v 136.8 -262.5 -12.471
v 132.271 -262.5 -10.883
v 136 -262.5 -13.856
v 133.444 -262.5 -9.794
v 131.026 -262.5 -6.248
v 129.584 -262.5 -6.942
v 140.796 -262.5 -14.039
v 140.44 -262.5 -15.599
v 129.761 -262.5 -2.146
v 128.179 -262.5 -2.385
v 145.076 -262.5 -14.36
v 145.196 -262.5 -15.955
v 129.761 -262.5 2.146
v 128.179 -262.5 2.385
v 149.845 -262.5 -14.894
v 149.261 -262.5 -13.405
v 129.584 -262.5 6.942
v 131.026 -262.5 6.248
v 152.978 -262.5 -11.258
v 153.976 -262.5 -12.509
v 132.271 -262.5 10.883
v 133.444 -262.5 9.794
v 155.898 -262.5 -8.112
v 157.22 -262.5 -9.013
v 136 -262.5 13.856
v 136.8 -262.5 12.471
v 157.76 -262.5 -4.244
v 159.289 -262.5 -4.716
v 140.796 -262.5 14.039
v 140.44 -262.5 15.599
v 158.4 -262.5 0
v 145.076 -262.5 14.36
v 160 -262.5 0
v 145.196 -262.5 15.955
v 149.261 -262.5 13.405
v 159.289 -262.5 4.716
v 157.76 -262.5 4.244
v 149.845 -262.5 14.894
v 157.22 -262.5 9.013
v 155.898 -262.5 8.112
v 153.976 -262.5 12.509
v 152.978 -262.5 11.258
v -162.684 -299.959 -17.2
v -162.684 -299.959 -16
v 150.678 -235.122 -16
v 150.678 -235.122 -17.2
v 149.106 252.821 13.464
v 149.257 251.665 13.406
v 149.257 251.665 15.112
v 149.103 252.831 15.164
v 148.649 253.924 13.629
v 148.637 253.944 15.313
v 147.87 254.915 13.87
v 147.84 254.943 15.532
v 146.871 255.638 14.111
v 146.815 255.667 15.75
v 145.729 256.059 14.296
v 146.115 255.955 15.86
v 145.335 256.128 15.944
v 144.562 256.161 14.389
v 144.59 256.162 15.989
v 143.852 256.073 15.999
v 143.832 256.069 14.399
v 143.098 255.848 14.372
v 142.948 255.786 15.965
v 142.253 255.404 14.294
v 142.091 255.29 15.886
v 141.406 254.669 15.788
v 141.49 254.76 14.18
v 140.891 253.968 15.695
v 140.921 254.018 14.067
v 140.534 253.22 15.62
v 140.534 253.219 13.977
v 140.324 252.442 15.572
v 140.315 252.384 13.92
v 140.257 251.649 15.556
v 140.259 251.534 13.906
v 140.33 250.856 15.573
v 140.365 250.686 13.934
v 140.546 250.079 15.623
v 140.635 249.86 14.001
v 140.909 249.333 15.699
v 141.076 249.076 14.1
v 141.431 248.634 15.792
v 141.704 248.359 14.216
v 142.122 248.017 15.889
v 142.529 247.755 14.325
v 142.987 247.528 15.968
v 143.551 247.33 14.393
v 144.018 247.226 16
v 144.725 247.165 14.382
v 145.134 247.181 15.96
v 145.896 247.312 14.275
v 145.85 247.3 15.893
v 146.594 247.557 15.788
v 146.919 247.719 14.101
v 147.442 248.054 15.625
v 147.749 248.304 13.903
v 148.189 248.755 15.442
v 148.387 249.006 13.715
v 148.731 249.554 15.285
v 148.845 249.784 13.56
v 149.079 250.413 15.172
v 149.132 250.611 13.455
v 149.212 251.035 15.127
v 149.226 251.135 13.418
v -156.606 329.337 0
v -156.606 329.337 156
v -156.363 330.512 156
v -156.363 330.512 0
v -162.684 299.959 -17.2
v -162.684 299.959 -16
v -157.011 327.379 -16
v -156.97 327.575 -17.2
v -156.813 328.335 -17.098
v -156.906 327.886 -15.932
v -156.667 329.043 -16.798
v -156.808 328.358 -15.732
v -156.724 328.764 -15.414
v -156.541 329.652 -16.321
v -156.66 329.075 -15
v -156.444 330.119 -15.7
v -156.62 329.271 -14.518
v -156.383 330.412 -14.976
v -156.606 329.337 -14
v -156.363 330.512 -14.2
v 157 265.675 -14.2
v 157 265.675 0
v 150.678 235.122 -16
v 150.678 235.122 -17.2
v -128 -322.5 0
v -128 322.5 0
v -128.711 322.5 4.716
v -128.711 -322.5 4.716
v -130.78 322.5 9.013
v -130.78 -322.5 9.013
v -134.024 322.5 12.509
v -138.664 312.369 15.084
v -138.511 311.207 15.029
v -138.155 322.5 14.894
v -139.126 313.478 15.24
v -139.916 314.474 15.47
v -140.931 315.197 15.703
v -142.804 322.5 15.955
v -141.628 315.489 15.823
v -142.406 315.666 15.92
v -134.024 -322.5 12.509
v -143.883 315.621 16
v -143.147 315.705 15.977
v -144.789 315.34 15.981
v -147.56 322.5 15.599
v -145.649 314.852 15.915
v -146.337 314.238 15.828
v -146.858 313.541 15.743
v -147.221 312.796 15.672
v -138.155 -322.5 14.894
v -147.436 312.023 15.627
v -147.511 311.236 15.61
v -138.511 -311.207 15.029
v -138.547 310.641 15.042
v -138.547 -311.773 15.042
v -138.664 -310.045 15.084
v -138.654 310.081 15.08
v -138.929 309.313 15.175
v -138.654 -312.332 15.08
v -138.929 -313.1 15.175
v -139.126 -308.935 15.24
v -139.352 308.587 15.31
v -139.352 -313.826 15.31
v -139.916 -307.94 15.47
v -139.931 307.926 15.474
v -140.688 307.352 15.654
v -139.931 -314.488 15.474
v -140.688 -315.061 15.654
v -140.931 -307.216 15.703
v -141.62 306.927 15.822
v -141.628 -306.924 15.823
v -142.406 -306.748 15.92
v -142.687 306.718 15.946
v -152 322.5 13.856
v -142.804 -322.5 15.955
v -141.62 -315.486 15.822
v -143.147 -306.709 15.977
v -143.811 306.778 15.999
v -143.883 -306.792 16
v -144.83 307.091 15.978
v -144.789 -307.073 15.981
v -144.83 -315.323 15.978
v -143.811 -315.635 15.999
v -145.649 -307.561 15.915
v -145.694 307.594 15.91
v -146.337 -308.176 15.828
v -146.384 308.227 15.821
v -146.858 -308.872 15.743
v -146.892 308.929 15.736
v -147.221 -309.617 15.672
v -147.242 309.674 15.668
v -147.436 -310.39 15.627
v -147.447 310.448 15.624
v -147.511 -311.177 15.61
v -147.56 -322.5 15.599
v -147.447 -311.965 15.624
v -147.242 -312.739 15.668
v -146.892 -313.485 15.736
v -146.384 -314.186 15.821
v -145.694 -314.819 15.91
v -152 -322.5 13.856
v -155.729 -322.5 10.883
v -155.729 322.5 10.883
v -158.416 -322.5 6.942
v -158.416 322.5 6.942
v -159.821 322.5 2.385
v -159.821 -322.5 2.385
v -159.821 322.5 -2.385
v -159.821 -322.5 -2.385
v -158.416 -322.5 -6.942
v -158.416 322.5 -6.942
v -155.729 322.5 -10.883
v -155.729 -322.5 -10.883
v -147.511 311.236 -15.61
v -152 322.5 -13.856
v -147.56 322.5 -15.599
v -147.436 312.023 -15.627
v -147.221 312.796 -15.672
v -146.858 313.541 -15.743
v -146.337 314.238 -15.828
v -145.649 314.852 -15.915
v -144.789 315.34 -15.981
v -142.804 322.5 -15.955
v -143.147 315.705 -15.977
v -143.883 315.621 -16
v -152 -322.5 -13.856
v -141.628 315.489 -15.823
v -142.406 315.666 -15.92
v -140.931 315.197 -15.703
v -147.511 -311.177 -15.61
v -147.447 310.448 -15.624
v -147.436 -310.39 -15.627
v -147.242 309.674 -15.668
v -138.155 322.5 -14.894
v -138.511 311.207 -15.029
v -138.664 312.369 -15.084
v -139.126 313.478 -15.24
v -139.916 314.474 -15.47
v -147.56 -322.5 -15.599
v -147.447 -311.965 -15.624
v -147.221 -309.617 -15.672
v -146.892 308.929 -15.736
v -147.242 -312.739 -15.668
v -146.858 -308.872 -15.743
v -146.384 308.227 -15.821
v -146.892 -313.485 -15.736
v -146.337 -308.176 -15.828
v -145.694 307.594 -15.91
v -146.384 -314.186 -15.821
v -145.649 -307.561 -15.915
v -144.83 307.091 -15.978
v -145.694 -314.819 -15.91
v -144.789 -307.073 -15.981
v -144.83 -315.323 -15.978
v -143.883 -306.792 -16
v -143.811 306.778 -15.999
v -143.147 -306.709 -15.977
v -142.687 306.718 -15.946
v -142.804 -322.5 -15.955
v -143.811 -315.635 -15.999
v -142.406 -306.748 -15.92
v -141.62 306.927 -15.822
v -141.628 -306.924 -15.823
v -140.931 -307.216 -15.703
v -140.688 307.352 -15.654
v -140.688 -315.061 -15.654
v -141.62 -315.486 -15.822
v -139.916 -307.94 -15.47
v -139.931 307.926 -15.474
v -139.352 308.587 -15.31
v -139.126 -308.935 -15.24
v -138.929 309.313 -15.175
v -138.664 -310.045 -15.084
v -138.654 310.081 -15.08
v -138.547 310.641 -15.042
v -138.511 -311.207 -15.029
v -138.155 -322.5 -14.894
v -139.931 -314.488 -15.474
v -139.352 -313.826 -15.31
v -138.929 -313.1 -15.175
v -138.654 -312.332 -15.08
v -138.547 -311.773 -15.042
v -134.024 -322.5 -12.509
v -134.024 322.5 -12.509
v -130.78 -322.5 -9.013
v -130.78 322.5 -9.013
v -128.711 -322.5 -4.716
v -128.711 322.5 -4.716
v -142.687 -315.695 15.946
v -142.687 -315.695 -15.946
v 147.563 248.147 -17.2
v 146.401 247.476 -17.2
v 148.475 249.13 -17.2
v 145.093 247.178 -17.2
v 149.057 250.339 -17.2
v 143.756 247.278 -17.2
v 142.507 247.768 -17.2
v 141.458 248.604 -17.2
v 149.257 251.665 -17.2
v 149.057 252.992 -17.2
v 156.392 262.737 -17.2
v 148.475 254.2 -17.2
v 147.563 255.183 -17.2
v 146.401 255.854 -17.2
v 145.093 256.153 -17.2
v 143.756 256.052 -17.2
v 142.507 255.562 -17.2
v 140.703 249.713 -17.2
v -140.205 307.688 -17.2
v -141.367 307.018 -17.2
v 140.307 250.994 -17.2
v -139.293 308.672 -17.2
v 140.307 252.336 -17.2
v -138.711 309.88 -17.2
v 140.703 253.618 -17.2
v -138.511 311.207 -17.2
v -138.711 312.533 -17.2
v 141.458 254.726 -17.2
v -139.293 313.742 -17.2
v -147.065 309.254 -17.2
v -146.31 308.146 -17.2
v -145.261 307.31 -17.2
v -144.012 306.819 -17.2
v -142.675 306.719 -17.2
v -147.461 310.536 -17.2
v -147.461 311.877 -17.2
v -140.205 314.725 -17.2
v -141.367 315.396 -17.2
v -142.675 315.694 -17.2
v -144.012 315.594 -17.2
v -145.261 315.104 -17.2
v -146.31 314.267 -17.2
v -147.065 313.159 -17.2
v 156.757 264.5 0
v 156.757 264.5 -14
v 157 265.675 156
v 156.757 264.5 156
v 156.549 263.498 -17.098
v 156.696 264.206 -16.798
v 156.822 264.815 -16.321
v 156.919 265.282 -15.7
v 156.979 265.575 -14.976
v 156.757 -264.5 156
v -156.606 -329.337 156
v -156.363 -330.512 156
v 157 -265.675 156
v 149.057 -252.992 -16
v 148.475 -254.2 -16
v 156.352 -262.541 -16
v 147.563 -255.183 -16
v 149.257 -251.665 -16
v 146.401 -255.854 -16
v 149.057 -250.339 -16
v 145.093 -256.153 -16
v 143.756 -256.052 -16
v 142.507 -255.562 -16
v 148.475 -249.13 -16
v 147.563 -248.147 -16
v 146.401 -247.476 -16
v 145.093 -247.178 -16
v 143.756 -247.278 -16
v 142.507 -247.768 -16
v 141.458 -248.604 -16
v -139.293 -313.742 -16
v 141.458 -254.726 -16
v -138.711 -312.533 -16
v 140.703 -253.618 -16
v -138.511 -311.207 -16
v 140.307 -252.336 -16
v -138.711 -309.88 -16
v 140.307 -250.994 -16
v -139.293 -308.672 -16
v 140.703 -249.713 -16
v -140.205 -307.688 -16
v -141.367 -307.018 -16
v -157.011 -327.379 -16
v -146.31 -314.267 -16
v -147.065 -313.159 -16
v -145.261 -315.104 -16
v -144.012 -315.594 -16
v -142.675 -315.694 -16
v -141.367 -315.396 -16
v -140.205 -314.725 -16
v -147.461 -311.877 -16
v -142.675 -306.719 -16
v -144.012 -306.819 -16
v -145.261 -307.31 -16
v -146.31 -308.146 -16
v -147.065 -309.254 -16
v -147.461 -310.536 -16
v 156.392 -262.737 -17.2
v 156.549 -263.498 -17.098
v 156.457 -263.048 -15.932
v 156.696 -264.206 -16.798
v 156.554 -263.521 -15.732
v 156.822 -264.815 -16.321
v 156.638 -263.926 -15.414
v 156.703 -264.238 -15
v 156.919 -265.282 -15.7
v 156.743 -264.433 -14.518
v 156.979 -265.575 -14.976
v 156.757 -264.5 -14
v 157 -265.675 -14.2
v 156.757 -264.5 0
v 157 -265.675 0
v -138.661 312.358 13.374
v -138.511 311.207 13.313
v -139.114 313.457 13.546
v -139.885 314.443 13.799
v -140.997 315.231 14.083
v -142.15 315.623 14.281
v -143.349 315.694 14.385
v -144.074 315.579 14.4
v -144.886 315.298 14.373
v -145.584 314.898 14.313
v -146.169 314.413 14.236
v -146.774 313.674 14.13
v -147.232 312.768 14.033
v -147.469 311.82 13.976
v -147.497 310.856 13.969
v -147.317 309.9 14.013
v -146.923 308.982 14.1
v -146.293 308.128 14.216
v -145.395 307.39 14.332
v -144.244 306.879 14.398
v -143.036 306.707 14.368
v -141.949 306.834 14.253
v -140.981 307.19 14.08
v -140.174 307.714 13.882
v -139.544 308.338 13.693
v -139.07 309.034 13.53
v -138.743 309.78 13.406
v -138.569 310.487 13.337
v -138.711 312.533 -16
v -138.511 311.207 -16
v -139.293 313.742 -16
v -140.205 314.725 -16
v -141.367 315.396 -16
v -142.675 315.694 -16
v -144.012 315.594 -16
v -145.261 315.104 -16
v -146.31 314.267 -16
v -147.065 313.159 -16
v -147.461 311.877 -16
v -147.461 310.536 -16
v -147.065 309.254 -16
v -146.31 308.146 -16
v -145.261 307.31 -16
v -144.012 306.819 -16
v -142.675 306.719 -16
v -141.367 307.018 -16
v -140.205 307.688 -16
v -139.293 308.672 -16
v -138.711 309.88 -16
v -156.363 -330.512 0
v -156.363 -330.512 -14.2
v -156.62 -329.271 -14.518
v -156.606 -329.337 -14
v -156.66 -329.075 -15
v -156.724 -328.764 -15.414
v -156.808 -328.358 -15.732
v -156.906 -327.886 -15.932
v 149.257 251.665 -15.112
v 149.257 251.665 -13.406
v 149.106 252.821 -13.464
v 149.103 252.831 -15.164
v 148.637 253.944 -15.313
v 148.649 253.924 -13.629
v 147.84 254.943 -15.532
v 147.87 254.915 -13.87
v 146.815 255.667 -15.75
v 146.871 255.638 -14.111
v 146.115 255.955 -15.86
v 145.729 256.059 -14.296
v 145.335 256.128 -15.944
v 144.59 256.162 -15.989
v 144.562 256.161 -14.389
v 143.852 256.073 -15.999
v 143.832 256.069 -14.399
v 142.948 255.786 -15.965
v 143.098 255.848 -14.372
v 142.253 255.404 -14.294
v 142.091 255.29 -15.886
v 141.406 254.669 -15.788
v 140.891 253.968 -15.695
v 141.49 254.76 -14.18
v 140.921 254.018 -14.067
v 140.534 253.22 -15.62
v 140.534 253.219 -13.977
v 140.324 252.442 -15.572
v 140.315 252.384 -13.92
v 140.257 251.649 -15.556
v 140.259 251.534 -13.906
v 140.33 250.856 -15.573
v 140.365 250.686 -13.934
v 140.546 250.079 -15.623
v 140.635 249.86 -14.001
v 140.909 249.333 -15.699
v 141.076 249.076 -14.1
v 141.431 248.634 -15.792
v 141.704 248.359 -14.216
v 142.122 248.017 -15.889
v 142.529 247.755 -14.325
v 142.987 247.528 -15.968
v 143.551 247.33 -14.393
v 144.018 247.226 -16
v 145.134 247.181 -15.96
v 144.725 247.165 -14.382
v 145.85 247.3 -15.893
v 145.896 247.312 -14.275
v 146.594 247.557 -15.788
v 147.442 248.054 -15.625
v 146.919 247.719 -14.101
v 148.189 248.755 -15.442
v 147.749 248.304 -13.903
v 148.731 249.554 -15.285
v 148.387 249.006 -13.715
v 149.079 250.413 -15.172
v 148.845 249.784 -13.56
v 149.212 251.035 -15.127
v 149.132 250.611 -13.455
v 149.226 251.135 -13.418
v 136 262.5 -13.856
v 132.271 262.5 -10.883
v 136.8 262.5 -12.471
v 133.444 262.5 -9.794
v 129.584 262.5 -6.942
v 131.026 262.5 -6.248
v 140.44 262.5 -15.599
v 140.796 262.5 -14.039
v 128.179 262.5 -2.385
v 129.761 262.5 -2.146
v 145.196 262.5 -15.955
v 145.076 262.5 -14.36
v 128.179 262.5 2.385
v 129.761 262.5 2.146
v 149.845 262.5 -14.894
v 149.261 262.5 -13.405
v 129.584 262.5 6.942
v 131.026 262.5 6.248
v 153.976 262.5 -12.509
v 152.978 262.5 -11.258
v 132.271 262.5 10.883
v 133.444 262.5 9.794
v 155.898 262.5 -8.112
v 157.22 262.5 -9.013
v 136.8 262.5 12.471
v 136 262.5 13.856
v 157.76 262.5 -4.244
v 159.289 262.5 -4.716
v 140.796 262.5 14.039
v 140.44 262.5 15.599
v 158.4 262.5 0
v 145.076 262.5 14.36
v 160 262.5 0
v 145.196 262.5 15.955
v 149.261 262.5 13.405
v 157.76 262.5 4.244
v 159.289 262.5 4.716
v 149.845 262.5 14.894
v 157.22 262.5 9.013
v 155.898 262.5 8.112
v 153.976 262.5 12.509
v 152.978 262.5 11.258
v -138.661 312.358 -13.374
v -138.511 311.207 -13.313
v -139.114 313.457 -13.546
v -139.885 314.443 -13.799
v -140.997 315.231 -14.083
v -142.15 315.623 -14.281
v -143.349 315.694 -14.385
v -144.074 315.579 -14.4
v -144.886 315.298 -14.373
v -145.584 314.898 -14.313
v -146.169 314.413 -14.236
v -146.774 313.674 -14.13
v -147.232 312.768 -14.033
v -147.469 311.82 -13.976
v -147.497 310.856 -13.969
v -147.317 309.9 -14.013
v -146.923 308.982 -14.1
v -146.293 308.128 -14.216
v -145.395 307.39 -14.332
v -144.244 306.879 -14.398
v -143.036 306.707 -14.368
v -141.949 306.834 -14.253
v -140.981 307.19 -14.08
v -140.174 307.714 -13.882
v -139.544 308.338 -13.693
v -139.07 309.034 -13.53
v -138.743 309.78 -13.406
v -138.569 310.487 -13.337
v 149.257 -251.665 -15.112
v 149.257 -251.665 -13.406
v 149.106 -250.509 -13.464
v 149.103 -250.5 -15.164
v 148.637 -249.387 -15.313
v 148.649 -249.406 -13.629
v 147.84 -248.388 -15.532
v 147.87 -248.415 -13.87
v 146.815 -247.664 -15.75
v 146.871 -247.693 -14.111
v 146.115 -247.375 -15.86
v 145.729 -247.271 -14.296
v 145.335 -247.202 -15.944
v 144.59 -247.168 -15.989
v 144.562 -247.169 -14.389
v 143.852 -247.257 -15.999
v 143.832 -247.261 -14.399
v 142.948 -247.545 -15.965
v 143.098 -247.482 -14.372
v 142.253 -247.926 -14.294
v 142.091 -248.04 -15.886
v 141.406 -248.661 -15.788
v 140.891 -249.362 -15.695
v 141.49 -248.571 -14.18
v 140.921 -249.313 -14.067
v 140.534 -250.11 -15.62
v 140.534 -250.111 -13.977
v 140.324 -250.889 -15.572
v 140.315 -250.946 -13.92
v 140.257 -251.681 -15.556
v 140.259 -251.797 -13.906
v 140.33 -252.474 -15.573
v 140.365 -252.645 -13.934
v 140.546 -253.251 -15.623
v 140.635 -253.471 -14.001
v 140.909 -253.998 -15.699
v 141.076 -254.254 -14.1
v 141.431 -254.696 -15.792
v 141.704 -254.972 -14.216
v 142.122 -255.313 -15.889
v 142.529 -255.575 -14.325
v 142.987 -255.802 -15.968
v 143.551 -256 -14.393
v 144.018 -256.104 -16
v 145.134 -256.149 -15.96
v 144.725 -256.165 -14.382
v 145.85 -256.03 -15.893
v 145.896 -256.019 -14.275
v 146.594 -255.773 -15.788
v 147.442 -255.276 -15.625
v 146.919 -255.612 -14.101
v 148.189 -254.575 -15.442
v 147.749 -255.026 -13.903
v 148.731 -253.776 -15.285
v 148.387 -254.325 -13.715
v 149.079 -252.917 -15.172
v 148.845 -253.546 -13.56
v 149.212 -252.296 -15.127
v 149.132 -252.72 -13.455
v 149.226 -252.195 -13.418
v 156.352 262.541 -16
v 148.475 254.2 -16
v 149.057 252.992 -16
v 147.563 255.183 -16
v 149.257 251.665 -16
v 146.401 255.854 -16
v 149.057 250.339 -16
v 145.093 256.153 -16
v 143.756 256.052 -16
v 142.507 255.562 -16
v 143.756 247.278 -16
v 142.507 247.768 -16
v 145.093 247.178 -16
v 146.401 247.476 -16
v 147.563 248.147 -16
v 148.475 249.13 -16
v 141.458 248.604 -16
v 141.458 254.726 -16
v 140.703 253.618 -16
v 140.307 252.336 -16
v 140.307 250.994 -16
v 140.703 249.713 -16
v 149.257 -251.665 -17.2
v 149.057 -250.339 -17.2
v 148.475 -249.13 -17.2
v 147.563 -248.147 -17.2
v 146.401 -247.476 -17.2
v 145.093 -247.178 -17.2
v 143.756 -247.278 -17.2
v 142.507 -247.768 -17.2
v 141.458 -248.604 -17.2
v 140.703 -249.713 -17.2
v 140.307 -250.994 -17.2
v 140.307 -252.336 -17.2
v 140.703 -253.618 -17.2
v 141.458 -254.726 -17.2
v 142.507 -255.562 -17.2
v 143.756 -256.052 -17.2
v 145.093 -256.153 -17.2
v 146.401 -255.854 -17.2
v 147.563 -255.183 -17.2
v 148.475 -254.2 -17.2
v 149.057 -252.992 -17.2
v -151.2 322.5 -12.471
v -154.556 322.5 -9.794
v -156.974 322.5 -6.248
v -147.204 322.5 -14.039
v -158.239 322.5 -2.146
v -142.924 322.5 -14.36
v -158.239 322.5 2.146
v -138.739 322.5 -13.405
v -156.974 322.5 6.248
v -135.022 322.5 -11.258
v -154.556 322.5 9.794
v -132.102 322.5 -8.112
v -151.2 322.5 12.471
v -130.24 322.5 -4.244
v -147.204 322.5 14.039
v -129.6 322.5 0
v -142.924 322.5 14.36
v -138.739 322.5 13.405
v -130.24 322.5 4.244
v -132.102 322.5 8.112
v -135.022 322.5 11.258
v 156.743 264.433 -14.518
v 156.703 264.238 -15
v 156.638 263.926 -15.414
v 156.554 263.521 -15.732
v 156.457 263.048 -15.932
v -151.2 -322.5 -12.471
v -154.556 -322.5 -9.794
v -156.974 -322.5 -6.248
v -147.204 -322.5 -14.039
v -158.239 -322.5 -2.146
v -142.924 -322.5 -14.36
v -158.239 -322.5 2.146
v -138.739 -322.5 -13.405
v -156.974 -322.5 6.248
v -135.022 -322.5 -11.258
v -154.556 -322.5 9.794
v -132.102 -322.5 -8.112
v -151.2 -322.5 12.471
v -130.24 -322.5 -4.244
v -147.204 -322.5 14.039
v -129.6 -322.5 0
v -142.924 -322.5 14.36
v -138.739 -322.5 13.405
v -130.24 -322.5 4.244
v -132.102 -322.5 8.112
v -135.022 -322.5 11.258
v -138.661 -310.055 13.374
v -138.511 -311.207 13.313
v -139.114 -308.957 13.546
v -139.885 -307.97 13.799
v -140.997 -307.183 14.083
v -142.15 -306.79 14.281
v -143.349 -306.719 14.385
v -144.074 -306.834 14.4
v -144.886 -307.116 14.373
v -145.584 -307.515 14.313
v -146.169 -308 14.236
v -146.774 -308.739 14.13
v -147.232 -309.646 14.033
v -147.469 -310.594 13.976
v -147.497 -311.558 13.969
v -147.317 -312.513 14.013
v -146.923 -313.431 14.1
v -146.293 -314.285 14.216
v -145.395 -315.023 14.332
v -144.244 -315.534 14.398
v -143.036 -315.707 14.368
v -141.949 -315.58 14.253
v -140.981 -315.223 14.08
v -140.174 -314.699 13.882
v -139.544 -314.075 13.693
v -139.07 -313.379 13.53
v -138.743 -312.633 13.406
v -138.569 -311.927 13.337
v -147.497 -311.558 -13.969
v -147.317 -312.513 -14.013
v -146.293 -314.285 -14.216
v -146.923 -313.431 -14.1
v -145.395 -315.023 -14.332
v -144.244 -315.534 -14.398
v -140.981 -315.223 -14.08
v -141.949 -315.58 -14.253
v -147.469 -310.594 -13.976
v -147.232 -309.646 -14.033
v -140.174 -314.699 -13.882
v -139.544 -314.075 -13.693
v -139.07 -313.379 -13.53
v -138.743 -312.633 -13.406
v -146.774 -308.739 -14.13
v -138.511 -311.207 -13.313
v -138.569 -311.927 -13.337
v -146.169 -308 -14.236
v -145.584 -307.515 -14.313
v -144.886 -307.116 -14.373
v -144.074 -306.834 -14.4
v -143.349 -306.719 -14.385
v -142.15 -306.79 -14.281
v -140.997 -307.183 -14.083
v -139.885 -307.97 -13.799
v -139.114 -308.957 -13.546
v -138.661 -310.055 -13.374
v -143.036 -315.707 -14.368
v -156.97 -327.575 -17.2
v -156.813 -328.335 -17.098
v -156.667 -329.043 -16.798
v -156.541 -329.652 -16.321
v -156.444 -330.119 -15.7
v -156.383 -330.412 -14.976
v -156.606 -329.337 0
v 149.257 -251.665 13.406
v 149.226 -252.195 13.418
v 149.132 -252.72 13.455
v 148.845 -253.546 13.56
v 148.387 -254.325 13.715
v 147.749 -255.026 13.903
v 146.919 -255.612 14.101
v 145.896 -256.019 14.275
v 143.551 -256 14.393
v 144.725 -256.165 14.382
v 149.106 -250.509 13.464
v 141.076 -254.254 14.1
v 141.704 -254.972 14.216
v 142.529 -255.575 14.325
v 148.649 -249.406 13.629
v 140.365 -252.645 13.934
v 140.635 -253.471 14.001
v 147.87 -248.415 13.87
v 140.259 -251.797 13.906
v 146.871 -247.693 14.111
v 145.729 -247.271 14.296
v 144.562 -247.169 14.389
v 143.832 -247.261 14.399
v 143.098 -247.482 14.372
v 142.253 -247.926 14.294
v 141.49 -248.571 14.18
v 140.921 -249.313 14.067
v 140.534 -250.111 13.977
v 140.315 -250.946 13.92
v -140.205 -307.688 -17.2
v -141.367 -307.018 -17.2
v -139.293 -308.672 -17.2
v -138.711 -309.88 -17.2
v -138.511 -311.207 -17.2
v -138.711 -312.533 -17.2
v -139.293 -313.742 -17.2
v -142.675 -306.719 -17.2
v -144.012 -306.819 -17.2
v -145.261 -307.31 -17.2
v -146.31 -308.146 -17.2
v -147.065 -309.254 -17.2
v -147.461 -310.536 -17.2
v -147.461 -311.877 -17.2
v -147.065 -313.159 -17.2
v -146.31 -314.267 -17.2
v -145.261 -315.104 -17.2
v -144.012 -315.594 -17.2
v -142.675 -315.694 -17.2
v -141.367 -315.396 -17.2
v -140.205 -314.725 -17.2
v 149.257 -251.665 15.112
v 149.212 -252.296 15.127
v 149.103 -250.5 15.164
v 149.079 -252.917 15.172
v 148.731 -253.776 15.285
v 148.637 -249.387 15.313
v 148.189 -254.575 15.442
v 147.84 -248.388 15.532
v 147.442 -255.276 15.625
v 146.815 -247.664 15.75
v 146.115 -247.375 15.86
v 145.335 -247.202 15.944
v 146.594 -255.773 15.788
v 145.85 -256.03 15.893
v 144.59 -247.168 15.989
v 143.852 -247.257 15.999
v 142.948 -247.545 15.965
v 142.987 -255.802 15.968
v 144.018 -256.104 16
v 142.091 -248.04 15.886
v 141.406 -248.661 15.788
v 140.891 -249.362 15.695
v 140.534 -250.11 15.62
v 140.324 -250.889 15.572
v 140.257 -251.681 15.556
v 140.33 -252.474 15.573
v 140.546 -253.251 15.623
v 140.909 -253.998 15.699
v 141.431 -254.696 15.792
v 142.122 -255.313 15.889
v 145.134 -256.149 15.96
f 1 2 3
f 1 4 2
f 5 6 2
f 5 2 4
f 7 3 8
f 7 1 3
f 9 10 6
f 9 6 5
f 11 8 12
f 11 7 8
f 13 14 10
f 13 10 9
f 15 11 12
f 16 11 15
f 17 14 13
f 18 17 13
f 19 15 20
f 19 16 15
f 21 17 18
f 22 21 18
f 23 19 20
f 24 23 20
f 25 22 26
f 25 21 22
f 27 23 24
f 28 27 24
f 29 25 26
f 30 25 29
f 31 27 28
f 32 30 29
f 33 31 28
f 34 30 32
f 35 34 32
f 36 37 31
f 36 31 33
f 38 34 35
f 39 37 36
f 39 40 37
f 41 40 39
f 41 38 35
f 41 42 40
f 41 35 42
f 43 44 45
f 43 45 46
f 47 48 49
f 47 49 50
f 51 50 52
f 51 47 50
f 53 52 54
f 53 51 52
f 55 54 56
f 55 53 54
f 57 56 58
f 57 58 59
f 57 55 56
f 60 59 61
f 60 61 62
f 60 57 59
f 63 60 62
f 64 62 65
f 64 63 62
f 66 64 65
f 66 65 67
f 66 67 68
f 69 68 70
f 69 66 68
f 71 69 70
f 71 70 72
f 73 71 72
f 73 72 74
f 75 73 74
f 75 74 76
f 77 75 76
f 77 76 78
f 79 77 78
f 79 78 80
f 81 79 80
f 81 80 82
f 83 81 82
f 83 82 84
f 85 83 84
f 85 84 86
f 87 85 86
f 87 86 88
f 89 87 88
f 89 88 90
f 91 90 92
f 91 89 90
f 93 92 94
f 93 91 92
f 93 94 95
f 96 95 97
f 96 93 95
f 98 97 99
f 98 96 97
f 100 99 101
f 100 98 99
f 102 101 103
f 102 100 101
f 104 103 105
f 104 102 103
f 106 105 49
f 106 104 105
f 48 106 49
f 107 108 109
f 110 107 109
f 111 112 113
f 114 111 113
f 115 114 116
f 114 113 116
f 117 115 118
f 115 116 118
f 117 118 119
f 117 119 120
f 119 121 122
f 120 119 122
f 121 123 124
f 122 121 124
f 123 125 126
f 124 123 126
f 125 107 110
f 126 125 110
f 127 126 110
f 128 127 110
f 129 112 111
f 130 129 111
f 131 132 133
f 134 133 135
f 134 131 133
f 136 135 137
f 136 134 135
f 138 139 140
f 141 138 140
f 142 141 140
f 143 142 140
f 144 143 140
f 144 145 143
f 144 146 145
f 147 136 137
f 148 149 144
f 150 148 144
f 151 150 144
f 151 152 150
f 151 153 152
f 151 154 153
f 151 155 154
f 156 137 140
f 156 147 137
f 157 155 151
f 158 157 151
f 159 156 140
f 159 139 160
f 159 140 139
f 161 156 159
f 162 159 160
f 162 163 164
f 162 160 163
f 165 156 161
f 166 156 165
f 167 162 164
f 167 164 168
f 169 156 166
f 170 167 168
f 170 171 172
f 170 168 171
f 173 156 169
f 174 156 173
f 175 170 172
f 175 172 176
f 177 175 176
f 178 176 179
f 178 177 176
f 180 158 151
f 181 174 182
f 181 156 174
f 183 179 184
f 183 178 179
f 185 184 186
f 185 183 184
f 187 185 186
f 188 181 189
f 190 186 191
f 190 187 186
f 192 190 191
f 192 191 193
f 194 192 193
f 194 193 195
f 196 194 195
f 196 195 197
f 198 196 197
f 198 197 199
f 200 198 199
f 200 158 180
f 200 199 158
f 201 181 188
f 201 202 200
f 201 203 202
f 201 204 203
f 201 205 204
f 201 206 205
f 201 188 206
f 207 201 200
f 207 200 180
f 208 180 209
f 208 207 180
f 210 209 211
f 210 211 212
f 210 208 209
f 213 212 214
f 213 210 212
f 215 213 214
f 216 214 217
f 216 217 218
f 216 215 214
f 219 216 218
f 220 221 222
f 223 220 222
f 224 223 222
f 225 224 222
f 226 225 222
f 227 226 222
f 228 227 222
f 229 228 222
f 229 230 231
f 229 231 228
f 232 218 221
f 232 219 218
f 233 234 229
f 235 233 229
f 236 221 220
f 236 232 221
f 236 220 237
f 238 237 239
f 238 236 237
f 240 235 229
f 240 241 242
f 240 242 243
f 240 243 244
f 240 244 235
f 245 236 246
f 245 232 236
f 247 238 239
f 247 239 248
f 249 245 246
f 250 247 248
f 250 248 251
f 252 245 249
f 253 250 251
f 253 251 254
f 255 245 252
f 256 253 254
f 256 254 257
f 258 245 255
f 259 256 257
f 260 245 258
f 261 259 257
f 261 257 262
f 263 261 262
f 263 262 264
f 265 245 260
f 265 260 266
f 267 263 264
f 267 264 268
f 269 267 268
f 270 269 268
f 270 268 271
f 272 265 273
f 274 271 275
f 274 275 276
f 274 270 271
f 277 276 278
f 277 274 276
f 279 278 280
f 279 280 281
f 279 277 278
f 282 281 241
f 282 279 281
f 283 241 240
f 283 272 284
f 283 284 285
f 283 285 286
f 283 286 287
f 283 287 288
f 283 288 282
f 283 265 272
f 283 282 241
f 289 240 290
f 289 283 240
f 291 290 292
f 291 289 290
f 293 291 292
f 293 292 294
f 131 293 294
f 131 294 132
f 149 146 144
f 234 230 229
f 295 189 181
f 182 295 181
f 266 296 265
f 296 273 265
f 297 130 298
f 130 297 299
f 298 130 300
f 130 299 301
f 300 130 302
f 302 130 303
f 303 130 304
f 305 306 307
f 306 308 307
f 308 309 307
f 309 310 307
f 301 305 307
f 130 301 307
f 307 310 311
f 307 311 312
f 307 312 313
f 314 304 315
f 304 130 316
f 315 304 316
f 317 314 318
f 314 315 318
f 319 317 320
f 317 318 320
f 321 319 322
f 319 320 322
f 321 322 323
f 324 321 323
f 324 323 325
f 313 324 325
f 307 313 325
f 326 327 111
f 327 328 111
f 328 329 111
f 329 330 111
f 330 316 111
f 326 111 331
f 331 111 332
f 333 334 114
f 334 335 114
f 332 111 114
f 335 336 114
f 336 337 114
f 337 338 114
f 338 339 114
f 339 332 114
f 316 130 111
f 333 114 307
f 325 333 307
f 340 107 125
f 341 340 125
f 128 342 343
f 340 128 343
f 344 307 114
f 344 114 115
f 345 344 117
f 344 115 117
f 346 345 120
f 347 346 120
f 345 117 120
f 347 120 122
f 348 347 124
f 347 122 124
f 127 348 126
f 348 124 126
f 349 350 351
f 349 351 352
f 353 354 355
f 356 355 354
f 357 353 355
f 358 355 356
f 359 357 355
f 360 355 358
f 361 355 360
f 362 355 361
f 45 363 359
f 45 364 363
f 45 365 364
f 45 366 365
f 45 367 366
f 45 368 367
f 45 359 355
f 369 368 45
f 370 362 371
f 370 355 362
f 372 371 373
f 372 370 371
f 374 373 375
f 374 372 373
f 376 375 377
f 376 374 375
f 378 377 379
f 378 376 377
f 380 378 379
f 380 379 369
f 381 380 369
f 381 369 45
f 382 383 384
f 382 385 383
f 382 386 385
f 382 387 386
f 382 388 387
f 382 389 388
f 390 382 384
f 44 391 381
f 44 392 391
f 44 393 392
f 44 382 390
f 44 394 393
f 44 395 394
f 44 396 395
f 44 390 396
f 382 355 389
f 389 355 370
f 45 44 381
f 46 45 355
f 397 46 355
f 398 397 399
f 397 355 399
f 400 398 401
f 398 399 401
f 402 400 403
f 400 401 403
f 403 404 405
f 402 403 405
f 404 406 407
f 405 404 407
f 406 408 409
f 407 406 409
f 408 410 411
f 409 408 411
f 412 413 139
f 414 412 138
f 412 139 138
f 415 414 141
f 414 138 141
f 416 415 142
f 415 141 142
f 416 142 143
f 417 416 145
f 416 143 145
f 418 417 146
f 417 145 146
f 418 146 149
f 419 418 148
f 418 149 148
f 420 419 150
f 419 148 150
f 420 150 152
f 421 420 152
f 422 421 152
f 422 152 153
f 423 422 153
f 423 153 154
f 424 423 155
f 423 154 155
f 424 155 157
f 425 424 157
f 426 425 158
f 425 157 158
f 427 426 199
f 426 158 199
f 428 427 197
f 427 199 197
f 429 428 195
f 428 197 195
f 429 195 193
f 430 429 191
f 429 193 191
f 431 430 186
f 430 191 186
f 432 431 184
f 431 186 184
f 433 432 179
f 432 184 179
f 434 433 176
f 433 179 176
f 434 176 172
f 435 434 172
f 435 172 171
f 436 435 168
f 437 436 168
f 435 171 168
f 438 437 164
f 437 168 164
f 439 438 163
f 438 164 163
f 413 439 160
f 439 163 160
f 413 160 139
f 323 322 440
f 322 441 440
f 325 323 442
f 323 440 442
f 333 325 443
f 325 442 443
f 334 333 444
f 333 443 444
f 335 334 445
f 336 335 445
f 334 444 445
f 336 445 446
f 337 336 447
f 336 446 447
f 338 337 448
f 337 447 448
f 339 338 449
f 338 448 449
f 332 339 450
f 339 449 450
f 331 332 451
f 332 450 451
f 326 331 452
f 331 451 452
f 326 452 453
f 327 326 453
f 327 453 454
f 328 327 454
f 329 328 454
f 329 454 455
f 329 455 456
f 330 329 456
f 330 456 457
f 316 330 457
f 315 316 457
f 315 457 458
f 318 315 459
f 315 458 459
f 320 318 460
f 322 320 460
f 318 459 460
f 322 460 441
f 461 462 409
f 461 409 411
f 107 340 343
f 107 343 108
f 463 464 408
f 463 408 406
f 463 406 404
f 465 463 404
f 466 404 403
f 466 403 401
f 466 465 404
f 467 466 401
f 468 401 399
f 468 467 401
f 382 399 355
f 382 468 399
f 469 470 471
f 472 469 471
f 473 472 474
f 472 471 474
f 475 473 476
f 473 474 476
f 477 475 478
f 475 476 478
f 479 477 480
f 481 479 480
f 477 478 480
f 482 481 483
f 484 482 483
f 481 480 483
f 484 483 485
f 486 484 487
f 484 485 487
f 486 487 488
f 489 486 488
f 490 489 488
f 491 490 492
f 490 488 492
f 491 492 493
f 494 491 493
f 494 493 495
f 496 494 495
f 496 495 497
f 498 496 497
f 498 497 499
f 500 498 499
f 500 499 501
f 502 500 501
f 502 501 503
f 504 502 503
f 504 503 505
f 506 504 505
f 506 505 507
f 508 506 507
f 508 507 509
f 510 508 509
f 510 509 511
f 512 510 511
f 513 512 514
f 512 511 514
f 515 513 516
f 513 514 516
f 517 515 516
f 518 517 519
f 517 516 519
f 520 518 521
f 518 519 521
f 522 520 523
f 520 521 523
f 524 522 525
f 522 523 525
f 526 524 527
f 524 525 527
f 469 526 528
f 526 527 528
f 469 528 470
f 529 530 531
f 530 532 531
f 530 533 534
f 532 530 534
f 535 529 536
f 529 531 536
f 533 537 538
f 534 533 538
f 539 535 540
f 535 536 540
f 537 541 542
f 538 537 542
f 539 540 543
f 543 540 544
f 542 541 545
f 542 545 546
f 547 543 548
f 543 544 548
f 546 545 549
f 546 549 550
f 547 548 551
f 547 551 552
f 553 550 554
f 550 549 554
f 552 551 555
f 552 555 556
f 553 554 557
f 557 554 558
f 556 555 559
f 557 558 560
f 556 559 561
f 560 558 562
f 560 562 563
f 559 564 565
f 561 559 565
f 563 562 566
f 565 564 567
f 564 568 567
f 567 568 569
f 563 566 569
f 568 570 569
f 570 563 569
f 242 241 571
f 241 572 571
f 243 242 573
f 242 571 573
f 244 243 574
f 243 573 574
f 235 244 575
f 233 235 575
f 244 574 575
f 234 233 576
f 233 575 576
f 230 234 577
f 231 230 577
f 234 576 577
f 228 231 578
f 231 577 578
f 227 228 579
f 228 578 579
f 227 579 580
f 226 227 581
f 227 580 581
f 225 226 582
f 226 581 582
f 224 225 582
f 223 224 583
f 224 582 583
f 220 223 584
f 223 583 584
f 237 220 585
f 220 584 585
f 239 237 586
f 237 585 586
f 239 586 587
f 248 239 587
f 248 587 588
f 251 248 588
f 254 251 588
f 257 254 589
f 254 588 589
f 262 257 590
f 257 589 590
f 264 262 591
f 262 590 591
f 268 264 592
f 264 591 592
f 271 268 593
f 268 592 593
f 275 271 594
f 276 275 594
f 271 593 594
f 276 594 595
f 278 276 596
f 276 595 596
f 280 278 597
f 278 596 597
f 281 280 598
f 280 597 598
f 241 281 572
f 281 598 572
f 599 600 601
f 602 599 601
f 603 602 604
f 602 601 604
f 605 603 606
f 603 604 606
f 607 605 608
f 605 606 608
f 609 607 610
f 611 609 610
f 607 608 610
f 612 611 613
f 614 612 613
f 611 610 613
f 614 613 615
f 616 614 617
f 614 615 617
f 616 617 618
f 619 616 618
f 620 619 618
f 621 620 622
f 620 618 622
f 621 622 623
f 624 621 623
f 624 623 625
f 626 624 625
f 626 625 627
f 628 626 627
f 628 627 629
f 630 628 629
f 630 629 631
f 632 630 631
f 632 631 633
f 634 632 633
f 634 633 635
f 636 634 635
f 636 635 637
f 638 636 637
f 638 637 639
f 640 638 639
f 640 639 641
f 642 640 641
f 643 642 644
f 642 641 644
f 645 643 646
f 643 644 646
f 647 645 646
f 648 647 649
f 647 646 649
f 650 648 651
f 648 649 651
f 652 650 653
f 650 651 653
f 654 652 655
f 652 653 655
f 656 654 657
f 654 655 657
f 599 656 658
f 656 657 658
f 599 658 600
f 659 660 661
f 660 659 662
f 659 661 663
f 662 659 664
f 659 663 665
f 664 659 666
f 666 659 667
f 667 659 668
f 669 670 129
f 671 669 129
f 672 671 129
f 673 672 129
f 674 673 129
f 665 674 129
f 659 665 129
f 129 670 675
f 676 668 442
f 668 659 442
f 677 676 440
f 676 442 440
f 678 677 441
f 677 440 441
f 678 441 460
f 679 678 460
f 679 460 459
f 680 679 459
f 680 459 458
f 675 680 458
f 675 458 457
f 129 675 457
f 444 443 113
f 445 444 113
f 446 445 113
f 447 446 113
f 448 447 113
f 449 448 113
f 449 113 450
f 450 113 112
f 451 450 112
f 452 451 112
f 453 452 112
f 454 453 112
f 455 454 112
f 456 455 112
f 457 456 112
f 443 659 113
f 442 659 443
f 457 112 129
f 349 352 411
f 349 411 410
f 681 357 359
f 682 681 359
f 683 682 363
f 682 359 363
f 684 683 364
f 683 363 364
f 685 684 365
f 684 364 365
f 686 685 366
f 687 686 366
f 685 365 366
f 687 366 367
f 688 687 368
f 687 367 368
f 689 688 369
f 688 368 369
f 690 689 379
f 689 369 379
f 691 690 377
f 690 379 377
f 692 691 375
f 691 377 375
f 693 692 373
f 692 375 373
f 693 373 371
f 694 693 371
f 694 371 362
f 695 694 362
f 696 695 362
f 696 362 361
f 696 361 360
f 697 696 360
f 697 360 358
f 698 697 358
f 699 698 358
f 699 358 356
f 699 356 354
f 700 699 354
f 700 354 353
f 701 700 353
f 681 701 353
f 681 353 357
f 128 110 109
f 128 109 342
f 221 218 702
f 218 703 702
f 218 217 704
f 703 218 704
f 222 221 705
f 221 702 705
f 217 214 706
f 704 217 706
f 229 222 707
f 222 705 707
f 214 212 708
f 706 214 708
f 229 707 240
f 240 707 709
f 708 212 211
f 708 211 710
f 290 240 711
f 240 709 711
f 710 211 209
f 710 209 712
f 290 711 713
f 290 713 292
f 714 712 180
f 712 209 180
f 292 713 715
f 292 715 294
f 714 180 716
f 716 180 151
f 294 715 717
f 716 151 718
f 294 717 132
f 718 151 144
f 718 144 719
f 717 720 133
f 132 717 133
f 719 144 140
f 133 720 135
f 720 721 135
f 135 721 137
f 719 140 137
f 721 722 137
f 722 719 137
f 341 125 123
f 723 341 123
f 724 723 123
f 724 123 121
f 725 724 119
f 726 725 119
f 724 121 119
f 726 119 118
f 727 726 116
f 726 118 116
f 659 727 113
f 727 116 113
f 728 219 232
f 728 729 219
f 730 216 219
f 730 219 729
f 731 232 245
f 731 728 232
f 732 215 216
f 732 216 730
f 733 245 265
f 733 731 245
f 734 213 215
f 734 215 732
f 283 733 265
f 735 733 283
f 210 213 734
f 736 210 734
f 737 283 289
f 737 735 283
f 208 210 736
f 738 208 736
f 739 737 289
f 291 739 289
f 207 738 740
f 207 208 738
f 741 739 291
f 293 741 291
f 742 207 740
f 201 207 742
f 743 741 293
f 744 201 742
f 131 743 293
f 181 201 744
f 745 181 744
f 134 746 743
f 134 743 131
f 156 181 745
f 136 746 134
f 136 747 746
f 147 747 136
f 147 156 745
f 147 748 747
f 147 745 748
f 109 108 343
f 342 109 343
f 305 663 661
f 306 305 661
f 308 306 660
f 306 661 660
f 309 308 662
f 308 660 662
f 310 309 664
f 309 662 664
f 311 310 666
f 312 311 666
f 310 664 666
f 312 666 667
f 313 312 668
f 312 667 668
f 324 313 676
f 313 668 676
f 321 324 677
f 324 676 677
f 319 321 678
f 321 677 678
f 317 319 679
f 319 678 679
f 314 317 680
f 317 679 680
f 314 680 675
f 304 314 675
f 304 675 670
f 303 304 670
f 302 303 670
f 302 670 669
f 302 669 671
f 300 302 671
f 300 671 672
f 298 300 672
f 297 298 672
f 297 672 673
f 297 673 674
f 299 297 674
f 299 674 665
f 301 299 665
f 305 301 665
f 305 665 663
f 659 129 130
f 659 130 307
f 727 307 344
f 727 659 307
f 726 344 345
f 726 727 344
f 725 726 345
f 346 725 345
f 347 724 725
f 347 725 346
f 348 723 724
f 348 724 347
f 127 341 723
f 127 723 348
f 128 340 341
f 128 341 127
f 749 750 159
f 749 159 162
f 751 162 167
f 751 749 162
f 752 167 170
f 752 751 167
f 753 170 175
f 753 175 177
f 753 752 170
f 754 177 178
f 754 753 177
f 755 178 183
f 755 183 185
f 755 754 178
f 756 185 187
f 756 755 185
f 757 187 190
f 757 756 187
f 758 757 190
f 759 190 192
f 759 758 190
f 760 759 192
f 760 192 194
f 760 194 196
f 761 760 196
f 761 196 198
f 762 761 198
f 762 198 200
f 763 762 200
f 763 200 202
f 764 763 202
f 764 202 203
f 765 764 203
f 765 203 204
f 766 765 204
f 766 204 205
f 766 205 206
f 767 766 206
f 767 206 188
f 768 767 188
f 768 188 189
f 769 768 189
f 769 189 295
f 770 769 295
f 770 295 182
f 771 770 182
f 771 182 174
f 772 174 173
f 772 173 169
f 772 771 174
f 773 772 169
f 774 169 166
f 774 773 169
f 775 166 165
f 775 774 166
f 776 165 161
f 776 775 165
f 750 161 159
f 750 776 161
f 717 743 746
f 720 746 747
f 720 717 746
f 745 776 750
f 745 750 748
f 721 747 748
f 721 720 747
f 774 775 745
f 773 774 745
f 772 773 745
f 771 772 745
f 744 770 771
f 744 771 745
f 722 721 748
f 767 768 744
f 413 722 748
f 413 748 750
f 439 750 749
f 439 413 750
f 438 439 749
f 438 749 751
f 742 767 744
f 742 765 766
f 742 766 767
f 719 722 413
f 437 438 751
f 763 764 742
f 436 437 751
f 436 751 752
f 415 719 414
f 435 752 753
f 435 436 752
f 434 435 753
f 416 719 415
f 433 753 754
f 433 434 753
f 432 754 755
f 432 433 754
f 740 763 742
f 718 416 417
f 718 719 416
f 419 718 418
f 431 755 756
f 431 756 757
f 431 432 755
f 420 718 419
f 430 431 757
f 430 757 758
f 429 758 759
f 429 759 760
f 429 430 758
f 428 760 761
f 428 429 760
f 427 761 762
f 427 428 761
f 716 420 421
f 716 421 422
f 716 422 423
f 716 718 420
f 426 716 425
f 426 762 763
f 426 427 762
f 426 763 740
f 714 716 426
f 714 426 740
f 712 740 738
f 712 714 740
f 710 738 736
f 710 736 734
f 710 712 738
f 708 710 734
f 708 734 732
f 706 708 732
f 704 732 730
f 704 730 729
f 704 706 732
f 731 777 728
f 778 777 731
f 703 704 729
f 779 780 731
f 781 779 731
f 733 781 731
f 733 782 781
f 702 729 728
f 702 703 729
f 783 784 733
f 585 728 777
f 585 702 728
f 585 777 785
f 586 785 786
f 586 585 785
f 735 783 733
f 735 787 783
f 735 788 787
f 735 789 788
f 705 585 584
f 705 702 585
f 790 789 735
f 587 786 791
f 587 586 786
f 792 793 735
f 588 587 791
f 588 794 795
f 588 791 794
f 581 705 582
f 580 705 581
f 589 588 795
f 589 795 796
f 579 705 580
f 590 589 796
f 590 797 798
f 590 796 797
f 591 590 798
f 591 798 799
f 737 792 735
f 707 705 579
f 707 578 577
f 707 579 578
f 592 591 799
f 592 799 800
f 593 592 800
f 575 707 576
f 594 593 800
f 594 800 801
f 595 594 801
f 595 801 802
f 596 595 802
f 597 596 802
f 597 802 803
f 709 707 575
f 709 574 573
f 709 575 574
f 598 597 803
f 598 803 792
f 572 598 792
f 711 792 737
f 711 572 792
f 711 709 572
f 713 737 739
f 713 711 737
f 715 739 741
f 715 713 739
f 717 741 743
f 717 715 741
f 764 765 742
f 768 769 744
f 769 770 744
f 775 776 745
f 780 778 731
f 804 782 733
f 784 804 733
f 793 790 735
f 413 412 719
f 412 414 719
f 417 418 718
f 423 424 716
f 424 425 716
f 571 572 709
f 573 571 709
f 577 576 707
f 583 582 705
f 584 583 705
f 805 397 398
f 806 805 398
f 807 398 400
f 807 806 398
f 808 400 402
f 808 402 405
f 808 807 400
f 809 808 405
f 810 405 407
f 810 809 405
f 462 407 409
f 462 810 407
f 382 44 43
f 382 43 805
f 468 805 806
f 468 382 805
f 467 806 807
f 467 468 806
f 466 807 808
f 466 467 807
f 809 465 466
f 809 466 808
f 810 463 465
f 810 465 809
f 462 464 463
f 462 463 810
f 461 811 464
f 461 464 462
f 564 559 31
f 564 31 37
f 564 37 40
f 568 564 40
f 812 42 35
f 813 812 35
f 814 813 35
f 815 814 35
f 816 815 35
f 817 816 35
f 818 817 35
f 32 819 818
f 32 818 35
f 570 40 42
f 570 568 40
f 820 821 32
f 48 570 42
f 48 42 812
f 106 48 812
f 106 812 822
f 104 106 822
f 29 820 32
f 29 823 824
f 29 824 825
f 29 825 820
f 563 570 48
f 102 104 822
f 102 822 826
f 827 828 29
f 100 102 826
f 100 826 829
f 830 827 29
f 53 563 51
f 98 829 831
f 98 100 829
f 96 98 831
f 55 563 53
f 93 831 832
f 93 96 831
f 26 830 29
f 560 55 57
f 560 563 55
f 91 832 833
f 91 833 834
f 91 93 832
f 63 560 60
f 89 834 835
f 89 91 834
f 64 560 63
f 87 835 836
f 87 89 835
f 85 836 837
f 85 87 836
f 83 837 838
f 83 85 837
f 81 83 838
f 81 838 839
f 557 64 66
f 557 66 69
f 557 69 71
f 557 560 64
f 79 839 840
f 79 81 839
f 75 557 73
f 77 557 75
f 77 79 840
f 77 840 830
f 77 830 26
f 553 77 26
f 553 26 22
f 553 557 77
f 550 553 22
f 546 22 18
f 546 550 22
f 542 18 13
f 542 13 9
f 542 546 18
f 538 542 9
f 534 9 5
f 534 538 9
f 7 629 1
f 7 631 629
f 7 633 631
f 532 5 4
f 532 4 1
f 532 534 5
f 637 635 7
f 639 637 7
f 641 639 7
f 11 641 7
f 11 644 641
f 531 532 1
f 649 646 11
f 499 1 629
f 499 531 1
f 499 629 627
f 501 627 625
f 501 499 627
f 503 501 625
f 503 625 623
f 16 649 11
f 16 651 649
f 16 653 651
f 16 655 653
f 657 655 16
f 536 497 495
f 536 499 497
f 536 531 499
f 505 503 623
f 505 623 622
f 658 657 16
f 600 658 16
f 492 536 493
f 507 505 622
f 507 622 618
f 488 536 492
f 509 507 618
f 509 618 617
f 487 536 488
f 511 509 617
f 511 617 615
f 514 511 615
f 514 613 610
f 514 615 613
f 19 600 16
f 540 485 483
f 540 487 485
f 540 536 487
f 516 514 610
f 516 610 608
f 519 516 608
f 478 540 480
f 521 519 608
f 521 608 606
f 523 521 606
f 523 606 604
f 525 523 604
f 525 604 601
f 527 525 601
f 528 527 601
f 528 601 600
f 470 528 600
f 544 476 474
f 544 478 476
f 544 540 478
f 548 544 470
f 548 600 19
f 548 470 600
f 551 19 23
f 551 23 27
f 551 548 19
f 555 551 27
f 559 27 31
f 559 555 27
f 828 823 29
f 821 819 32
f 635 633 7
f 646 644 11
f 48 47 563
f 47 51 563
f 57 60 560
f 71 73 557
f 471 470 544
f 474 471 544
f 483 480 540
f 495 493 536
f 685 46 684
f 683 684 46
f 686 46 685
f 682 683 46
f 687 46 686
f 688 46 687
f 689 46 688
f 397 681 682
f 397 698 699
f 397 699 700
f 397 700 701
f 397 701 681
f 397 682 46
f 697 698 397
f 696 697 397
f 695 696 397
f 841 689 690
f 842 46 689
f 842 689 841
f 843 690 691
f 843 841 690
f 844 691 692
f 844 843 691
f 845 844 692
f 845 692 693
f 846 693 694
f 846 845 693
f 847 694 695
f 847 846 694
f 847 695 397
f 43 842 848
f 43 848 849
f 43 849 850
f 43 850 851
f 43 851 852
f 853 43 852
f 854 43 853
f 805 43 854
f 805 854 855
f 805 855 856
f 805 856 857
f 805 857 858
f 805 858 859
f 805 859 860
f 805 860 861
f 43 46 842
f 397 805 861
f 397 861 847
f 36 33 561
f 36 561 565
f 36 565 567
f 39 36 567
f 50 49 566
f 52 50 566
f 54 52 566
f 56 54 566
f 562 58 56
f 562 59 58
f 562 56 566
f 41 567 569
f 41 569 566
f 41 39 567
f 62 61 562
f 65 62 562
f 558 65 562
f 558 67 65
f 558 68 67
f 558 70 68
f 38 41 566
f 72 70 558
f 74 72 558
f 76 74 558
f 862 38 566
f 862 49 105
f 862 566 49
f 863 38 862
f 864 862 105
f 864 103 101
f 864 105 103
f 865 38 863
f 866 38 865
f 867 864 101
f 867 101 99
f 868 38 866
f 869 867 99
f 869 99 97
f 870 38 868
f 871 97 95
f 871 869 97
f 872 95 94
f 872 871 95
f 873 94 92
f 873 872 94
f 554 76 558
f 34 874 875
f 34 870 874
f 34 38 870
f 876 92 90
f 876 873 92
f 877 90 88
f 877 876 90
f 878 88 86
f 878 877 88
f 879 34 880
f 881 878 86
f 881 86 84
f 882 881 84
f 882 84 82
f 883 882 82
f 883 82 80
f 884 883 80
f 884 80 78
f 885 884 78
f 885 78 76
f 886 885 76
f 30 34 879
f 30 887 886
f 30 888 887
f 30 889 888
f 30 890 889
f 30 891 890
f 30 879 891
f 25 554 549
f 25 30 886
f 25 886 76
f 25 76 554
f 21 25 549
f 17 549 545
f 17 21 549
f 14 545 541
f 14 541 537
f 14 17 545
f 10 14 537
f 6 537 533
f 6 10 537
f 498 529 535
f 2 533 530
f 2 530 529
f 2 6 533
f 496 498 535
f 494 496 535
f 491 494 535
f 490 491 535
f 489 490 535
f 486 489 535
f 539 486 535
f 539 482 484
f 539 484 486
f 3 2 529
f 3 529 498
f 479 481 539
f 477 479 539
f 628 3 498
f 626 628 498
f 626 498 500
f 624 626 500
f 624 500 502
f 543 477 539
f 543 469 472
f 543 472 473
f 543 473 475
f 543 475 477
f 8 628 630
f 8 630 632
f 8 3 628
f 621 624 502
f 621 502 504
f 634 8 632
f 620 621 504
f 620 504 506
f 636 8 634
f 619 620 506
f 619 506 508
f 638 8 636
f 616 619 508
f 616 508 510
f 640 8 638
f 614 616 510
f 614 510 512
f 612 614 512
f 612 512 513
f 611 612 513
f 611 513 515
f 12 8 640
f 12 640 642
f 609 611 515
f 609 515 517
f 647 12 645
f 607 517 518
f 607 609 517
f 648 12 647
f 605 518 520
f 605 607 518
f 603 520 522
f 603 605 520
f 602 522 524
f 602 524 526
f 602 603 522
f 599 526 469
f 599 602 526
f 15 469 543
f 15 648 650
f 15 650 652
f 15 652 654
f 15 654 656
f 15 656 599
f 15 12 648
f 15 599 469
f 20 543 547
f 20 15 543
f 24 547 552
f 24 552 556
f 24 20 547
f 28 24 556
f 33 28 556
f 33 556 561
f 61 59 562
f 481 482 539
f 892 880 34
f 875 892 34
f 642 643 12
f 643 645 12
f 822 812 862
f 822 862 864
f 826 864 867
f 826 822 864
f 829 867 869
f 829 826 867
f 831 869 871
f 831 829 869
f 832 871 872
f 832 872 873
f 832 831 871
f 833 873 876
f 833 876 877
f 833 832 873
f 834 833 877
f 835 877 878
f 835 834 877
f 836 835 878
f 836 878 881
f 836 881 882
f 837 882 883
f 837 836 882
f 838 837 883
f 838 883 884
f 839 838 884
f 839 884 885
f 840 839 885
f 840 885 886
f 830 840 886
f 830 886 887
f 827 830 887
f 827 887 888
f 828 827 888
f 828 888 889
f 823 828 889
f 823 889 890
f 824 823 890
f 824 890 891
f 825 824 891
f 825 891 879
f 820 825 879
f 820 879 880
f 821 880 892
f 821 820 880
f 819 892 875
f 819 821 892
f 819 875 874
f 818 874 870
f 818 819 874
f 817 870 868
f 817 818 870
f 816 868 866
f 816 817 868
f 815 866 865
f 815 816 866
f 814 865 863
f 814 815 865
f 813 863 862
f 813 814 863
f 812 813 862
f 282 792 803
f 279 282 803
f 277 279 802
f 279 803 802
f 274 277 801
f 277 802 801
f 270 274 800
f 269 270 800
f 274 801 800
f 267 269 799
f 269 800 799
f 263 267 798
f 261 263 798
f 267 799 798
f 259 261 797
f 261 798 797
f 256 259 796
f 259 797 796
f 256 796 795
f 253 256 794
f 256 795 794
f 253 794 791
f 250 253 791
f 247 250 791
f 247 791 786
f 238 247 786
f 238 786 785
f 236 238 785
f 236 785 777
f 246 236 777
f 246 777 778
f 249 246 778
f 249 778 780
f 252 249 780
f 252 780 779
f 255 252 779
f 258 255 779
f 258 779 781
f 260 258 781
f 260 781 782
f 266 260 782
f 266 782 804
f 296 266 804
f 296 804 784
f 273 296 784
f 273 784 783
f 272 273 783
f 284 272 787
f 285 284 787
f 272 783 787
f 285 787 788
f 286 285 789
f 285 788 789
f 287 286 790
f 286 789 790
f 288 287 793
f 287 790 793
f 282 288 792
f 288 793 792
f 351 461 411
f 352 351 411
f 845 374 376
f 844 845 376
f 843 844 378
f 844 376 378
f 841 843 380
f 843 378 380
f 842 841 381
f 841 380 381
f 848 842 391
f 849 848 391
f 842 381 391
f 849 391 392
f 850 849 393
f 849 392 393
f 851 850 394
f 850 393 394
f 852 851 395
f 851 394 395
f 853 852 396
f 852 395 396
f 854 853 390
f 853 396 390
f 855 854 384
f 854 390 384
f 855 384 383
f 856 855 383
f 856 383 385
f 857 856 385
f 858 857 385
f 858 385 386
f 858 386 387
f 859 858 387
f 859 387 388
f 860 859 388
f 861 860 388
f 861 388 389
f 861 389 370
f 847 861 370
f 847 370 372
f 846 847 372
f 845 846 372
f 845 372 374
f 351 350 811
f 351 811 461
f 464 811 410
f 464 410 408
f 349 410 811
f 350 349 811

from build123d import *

# Parameters (mm, degrees)
F0_R      = 16
F0_R_2    = 14.4
F1_DEPTH  = 322.5
F2_R      = 16
F2_R_2    = 14.4
F3_DEPTH  = 262.5
F5_DEPTH  = 156
F7_DEPTH  = 320
F9_R      = 4.5
F10_DEPTH = 18


with BuildPart() as f1:
    # F0 (on Front) → F1 (new body, symmetric)
    with BuildSketch(Plane.XZ):
        with Locations((-144, 0)):
            Circle(F0_R)
        with Locations((-144, 0)):
            Circle(F0_R_2, mode=Mode.SUBTRACT)
    extrude(amount=F1_DEPTH, both=True)


with BuildPart() as f3:
    # F2 (on Front) → F3 (new body, symmetric)
    with BuildSketch(Plane.XZ):
        with Locations((144, 0)):
            Circle(F2_R)
        with Locations((144, 0)):
            Circle(F2_R_2, mode=Mode.SUBTRACT)
    extrude(amount=F3_DEPTH, both=True)


with BuildPart() as f5:
    # F4 (on Top) → F5 (new body)
    with BuildSketch(Plane.XY):
        Polygon((156.7568603372, -264.5), (-156.6057600682, -329.3372434071), (-156.3626204054, -330.5123532336), (157, -265.6751098265), align=None)
    extrude(amount=F5_DEPTH)

    # F6 (on face) → F7 (join)
    with BuildSketch(Plane(origin=(-215.5216002673, -44.5931503826, 0), x_dir=(0.2026163856, -0.9792581888, 0), z_dir=(-0.9792581888, -0.2026163856, 0))):
        with BuildLine():
            Line((291.9752993958, 0), (290.7752993958, 0))
            Line((290.7752993958, 0), (290.7752993958, -14))
            ThreePointArc((290.7752993958, -14), (290.1895129582, -15.4142135624), (288.7752993958, -16))
            Line((288.7752993958, -16), (260.7752993958, -16))
            Line((260.7752993958, -16), (260.7752993958, -17.2))
            Line((260.7752993958, -17.2), (288.9752993958, -17.2))
            ThreePointArc((288.9752993958, -17.2), (291.0966197394, -16.3213203436), (291.9752993958, -14.2))
            Line((291.9752993958, -14.2), (291.9752993958, 0))
        make_face()
    extrude(amount=-F7_DEPTH)


with BuildPart() as f8_1:
    # F8: instance of F5
    add(f5.part.mirror(Plane.XZ))


with BuildPart() as f10_tool:
    # F9 (on Top) → F10 (new body, symmetric)
    with BuildSketch(Plane.XY):
        with Locations((-143.0109928395, -311.2066596619)):
            Circle(F9_R)
        with Locations((144.7568603372, -251.6651791975)):
            Circle(F9_R)
        with Locations((144.7568603372, 251.6651791975)):
            Circle(F9_R)
        with Locations((-143.0109928395, 311.2066596619)):
            Circle(F9_R)
    extrude(amount=F10_DEPTH, both=True)


with BuildPart() as f1_1:
    add(f1.part)

    # F10: cut by f10_tool
    add(f10_tool.part, mode=Mode.SUBTRACT)


with BuildPart() as f3_1:
    add(f3.part)

    # F10: cut by f10_tool
    add(f10_tool.part, mode=Mode.SUBTRACT)


with BuildPart() as f5_1:
    add(f5.part)

    # F10: cut by f10_tool
    add(f10_tool.part, mode=Mode.SUBTRACT)


with BuildPart() as f8_1_1:
    add(f8_1.part)

    # F10: cut by f10_tool
    add(f10_tool.part, mode=Mode.SUBTRACT)


solid = Compound([f1_1.part, f3_1.part, f5_1.part, f8_1_1.part])
